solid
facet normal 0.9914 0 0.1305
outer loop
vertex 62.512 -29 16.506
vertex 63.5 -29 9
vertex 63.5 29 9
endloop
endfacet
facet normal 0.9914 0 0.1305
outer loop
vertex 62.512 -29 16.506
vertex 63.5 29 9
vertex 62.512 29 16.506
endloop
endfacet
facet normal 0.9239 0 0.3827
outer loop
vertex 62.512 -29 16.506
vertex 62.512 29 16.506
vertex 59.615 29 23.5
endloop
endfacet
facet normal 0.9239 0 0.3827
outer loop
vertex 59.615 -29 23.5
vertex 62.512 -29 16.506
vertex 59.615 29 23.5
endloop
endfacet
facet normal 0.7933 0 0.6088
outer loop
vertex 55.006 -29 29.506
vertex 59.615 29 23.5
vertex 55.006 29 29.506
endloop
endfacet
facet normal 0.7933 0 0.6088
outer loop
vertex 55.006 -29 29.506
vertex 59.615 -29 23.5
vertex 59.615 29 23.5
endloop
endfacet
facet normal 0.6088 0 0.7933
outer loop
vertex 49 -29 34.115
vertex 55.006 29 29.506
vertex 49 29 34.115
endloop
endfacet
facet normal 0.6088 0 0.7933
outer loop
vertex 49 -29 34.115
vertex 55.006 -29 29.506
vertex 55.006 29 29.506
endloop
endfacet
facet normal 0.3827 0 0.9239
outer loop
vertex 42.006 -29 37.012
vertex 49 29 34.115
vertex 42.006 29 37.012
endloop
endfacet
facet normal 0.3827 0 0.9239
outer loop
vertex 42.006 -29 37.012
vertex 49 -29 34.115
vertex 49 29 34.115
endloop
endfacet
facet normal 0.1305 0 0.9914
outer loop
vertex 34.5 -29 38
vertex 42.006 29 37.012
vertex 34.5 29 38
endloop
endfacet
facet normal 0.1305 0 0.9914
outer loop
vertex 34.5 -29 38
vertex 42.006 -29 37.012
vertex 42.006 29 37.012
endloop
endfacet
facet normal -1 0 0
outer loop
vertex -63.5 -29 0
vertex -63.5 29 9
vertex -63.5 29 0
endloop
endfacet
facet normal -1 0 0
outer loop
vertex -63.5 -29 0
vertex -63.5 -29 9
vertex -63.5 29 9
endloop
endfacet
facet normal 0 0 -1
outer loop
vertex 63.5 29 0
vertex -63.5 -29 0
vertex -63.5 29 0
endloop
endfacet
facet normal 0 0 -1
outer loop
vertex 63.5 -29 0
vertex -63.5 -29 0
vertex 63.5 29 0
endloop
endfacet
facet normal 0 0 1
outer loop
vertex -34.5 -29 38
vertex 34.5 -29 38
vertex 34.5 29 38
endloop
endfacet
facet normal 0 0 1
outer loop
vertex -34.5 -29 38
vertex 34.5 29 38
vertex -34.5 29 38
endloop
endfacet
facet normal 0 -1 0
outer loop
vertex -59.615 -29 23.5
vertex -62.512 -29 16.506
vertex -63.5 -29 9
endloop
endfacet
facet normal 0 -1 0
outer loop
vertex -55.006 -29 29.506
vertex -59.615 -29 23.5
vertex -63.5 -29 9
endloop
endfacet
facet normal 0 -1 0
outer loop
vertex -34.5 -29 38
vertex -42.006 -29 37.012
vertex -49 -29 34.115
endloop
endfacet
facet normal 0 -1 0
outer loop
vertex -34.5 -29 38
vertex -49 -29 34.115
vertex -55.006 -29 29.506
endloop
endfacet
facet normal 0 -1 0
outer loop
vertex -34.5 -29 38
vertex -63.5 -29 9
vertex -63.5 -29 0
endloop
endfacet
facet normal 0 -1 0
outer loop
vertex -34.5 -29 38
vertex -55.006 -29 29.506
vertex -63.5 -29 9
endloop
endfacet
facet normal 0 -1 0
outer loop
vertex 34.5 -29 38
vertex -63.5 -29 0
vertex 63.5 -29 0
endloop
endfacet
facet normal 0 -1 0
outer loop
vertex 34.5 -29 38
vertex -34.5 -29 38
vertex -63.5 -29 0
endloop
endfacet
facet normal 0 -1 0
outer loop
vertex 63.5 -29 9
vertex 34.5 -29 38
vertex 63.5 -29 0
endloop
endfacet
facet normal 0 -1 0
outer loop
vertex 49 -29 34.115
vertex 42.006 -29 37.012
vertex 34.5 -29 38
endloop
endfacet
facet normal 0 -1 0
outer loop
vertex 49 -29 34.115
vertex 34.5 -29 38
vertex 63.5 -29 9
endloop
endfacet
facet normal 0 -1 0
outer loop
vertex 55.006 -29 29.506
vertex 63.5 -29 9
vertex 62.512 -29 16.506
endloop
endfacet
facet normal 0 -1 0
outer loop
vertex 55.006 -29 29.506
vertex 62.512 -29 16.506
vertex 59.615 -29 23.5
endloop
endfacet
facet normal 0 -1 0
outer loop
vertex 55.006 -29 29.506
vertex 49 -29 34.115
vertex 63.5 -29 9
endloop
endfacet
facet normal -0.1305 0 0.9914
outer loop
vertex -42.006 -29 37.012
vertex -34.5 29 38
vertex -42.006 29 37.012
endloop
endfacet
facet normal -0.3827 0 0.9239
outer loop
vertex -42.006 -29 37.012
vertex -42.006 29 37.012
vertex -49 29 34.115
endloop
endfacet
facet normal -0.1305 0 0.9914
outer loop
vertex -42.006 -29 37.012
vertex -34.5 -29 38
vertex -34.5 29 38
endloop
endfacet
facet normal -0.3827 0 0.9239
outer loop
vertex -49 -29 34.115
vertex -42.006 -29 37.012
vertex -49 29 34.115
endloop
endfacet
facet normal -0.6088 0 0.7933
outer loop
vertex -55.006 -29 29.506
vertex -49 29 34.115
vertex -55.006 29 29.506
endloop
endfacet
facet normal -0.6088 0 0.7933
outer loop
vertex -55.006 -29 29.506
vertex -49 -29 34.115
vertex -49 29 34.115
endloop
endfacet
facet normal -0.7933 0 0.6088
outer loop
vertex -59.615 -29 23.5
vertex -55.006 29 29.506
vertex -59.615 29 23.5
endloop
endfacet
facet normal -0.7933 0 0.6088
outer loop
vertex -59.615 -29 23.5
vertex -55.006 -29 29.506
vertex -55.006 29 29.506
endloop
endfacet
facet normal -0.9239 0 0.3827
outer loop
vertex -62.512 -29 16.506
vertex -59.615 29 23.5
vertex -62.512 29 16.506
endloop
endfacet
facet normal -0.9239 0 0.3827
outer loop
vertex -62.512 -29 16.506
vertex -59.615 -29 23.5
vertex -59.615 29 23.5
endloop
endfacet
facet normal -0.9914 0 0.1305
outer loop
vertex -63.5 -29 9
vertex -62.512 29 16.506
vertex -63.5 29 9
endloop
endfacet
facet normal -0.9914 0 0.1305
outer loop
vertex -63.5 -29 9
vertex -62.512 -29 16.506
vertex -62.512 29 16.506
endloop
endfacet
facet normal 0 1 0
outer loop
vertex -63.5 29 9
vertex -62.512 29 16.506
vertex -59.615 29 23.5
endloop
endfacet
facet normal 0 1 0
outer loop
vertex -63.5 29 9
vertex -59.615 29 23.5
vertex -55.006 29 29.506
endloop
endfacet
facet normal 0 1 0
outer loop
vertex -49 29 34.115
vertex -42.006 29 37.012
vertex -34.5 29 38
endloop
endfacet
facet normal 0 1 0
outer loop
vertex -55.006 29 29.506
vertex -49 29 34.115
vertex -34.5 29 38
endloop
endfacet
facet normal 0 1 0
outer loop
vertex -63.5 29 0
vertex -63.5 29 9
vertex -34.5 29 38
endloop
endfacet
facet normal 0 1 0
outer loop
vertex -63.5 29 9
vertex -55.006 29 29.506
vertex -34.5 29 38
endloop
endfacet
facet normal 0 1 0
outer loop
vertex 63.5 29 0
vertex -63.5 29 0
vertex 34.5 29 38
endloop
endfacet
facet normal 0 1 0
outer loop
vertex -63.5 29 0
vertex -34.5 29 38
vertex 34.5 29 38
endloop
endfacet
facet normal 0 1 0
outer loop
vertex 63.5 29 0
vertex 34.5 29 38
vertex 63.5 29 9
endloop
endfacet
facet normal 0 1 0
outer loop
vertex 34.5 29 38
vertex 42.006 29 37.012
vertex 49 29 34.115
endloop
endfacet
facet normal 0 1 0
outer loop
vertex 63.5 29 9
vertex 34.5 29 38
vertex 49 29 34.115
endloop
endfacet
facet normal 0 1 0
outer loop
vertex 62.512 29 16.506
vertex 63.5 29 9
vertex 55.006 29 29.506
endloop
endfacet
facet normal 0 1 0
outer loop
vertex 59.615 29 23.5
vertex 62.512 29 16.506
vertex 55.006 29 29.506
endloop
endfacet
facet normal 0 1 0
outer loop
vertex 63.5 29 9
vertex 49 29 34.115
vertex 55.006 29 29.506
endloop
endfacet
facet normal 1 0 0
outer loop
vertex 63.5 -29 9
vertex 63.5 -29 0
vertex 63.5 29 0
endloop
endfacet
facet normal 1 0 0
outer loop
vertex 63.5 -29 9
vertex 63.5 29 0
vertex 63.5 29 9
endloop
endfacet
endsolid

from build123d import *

# Parameters (mm, degrees)
F1_DEPTH = 29


with BuildPart() as f1:
    # F0 (on Front) → F1 (new body, symmetric)
    with BuildSketch(Plane.XZ):
        with BuildLine():
            Line((-63.5, 0), (63.5, 0))
            Line((63.5, 0), (63.5, 9))
            ThreePointArc((63.5, 9), (55.006097, 29.506097), (34.5, 38))
            Line((34.5, 38), (-34.5, 38))
            ThreePointArc((-34.5, 38), (-55.006097, 29.506097), (-63.5, 9))
            Line((-63.5, 9), (-63.5, 0))
        make_face()
    extrude(amount=F1_DEPTH, both=True)


solid = f1.part
